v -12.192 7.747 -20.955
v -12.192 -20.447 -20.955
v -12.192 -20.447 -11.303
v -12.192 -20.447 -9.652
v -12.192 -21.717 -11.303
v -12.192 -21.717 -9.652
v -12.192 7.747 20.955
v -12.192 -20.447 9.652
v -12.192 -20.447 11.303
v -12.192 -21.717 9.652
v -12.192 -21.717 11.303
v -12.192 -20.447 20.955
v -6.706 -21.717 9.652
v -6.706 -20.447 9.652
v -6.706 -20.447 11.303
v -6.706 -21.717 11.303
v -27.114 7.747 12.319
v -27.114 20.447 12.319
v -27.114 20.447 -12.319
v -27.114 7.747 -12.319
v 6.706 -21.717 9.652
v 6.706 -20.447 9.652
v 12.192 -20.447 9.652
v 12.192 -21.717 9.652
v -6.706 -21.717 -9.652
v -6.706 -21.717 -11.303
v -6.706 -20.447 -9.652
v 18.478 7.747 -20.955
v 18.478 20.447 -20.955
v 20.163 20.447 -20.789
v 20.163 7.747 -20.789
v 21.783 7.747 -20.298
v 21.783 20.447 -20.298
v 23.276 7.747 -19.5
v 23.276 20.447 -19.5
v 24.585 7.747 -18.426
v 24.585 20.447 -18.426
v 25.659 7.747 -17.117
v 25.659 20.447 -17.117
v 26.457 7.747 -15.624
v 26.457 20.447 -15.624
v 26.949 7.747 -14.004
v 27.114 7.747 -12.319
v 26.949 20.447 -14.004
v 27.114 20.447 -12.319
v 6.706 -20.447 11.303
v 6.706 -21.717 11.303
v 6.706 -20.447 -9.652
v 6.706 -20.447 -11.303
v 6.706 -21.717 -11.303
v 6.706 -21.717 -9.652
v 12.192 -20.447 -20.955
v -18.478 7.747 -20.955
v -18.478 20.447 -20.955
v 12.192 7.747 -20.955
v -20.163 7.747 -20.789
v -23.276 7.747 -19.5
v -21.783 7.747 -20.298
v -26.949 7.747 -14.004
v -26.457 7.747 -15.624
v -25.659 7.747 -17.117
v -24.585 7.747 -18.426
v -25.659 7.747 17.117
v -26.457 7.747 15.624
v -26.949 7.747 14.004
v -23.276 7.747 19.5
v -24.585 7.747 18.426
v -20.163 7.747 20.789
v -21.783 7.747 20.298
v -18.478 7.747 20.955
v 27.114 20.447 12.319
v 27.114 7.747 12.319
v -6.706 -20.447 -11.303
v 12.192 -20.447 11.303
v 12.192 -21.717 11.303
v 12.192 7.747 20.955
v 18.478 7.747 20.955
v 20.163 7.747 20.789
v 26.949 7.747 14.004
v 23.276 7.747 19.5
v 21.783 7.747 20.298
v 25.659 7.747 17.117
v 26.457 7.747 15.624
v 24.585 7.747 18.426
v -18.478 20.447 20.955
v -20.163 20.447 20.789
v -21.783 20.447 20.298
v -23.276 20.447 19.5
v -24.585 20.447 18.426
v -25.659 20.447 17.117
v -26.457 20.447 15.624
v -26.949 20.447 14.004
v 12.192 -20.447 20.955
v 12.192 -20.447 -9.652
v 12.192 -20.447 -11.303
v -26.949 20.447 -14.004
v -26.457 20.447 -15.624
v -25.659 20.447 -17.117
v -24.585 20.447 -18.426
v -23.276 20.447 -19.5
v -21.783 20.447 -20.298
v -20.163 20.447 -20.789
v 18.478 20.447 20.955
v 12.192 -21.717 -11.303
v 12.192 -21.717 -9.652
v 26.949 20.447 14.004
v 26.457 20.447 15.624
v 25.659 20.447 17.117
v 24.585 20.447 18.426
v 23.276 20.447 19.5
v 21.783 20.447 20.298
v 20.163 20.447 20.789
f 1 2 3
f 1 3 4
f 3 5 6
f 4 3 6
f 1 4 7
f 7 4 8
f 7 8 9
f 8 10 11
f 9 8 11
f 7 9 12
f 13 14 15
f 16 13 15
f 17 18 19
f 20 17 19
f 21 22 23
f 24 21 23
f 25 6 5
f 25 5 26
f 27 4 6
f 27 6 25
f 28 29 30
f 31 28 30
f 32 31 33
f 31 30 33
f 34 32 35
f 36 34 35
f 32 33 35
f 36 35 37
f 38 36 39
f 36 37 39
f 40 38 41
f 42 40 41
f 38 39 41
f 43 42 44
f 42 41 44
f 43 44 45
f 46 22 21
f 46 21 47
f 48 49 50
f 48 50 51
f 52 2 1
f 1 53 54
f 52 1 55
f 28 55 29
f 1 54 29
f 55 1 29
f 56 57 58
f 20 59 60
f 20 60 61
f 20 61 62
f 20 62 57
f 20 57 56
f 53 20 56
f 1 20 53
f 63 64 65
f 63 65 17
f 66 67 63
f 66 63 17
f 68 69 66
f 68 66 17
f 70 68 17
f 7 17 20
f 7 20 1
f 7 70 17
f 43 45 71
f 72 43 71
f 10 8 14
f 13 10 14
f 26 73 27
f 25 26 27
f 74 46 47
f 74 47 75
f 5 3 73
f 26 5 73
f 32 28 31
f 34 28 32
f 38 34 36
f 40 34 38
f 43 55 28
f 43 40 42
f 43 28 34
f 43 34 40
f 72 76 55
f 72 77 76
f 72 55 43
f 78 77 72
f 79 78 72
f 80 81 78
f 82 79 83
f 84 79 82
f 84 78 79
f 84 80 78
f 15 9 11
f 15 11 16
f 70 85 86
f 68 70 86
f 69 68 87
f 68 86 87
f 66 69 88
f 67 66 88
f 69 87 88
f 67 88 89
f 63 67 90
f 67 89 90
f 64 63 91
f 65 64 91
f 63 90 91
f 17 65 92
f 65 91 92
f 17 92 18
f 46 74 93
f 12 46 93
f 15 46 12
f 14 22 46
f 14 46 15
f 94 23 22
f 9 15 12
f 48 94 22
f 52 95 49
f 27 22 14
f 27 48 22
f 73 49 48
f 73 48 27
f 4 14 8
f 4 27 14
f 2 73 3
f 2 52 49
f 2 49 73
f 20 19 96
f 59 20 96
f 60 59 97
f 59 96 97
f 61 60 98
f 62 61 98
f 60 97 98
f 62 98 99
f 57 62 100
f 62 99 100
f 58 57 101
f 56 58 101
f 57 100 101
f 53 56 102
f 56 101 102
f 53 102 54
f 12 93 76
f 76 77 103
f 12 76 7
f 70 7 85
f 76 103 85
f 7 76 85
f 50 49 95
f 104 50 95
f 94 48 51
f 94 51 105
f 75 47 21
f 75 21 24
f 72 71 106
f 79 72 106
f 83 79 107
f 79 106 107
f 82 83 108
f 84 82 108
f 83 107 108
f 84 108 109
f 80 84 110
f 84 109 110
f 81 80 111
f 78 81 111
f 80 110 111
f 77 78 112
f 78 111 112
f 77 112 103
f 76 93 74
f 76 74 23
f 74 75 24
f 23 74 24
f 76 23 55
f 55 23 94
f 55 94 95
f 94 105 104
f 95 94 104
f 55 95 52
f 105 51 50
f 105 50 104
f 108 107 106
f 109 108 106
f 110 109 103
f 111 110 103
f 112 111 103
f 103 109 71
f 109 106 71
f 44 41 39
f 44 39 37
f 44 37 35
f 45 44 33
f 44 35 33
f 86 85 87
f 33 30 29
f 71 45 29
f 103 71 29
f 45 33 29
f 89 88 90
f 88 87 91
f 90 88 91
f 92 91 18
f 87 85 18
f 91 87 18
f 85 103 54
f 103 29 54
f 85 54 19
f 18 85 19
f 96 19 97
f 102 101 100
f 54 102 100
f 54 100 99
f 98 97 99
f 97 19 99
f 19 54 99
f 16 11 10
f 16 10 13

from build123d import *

# Parameters (mm, degrees)
BASE_EXTRUDE_DEPTH  = 20.447
CUT_EXTRUDE1_DEPTH  = 28.194
SKETCH3_W           = 5.4864
SKETCH3_H           = 1.651
BOSS_EXTRUDE1_DEPTH = 1.27


with BuildPart() as part:
    # Sketch1 → Base-Extrude (new, symmetric)
    with BuildSketch(Plane(origin=(0, 0, 0), x_dir=(1, 0, 0), z_dir=(0, 1, 0))):
        with BuildLine():
            Line((-18.4785, 20.955), (18.4785, 20.955))
            ThreePointArc((18.4785, 20.955), (24.585074162, 18.425574162), (27.1145, 12.319))
            Line((27.1145, 12.319), (27.1145, -12.319))
            ThreePointArc((27.1145, -12.319), (24.585074162, -18.425574162), (18.4785, -20.955))
            Line((18.4785, -20.955), (-18.4785, -20.955))
            ThreePointArc((-18.4785, -20.955), (-24.585074162, -18.425574162), (-27.1145, -12.319))
            Line((-27.1145, -12.319), (-27.1145, 12.319))
            ThreePointArc((-27.1145, 12.319), (-24.585074162, 18.425574162), (-18.4785, 20.955))
        make_face()
    extrude(amount=BASE_EXTRUDE_DEPTH, both=True)

    # Sketch2 → Cut-Extrude1 (cut)
    with BuildSketch(Plane.XZ.offset(20.447)):
        with BuildLine():
            Line((12.192, 20.955), (12.192, -20.955))
            Line((12.192, -20.955), (18.4785, -20.955))
            ThreePointArc((18.4785, -20.955), (24.585074162, -18.425574162), (27.1145, -12.319))
            Line((27.1145, -12.319), (27.1145, 12.319))
            ThreePointArc((27.1145, 12.319), (24.585074162, 18.425574162), (18.4785, 20.955))
            Line((18.4785, 20.955), (12.192, 20.955))
        make_face()
        with BuildLine():
            Line((-18.4785, -20.955), (-12.192, -20.955))
            Line((-12.192, -20.955), (-12.192, 20.955))
            Line((-12.192, 20.955), (-18.4785, 20.955))
            ThreePointArc((-18.4785, 20.955), (-24.585074162, 18.425574162), (-27.1145, 12.319))
            Line((-27.1145, 12.319), (-27.1145, -12.319))
            ThreePointArc((-27.1145, -12.319), (-24.585074162, -18.425574162), (-18.4785, -20.955))
        make_face()
    extrude(amount=-CUT_EXTRUDE1_DEPTH, mode=Mode.SUBTRACT)

    # Sketch3 → Boss-Extrude1 (add)
    with BuildSketch(Plane.XZ.offset(20.447)):
        with Locations((9.4488, -10.4775)):
            Rectangle(SKETCH3_W, SKETCH3_H)
        with Locations((9.4488, 10.4775)):
            Rectangle(SKETCH3_W, SKETCH3_H)
        with Locations((-9.4488, 10.4775)):
            Rectangle(SKETCH3_W, SKETCH3_H)
        with Locations((-9.4488, -10.4775)):
            Rectangle(SKETCH3_W, SKETCH3_H)
    extrude(amount=BOSS_EXTRUDE1_DEPTH)


solid = part.part
